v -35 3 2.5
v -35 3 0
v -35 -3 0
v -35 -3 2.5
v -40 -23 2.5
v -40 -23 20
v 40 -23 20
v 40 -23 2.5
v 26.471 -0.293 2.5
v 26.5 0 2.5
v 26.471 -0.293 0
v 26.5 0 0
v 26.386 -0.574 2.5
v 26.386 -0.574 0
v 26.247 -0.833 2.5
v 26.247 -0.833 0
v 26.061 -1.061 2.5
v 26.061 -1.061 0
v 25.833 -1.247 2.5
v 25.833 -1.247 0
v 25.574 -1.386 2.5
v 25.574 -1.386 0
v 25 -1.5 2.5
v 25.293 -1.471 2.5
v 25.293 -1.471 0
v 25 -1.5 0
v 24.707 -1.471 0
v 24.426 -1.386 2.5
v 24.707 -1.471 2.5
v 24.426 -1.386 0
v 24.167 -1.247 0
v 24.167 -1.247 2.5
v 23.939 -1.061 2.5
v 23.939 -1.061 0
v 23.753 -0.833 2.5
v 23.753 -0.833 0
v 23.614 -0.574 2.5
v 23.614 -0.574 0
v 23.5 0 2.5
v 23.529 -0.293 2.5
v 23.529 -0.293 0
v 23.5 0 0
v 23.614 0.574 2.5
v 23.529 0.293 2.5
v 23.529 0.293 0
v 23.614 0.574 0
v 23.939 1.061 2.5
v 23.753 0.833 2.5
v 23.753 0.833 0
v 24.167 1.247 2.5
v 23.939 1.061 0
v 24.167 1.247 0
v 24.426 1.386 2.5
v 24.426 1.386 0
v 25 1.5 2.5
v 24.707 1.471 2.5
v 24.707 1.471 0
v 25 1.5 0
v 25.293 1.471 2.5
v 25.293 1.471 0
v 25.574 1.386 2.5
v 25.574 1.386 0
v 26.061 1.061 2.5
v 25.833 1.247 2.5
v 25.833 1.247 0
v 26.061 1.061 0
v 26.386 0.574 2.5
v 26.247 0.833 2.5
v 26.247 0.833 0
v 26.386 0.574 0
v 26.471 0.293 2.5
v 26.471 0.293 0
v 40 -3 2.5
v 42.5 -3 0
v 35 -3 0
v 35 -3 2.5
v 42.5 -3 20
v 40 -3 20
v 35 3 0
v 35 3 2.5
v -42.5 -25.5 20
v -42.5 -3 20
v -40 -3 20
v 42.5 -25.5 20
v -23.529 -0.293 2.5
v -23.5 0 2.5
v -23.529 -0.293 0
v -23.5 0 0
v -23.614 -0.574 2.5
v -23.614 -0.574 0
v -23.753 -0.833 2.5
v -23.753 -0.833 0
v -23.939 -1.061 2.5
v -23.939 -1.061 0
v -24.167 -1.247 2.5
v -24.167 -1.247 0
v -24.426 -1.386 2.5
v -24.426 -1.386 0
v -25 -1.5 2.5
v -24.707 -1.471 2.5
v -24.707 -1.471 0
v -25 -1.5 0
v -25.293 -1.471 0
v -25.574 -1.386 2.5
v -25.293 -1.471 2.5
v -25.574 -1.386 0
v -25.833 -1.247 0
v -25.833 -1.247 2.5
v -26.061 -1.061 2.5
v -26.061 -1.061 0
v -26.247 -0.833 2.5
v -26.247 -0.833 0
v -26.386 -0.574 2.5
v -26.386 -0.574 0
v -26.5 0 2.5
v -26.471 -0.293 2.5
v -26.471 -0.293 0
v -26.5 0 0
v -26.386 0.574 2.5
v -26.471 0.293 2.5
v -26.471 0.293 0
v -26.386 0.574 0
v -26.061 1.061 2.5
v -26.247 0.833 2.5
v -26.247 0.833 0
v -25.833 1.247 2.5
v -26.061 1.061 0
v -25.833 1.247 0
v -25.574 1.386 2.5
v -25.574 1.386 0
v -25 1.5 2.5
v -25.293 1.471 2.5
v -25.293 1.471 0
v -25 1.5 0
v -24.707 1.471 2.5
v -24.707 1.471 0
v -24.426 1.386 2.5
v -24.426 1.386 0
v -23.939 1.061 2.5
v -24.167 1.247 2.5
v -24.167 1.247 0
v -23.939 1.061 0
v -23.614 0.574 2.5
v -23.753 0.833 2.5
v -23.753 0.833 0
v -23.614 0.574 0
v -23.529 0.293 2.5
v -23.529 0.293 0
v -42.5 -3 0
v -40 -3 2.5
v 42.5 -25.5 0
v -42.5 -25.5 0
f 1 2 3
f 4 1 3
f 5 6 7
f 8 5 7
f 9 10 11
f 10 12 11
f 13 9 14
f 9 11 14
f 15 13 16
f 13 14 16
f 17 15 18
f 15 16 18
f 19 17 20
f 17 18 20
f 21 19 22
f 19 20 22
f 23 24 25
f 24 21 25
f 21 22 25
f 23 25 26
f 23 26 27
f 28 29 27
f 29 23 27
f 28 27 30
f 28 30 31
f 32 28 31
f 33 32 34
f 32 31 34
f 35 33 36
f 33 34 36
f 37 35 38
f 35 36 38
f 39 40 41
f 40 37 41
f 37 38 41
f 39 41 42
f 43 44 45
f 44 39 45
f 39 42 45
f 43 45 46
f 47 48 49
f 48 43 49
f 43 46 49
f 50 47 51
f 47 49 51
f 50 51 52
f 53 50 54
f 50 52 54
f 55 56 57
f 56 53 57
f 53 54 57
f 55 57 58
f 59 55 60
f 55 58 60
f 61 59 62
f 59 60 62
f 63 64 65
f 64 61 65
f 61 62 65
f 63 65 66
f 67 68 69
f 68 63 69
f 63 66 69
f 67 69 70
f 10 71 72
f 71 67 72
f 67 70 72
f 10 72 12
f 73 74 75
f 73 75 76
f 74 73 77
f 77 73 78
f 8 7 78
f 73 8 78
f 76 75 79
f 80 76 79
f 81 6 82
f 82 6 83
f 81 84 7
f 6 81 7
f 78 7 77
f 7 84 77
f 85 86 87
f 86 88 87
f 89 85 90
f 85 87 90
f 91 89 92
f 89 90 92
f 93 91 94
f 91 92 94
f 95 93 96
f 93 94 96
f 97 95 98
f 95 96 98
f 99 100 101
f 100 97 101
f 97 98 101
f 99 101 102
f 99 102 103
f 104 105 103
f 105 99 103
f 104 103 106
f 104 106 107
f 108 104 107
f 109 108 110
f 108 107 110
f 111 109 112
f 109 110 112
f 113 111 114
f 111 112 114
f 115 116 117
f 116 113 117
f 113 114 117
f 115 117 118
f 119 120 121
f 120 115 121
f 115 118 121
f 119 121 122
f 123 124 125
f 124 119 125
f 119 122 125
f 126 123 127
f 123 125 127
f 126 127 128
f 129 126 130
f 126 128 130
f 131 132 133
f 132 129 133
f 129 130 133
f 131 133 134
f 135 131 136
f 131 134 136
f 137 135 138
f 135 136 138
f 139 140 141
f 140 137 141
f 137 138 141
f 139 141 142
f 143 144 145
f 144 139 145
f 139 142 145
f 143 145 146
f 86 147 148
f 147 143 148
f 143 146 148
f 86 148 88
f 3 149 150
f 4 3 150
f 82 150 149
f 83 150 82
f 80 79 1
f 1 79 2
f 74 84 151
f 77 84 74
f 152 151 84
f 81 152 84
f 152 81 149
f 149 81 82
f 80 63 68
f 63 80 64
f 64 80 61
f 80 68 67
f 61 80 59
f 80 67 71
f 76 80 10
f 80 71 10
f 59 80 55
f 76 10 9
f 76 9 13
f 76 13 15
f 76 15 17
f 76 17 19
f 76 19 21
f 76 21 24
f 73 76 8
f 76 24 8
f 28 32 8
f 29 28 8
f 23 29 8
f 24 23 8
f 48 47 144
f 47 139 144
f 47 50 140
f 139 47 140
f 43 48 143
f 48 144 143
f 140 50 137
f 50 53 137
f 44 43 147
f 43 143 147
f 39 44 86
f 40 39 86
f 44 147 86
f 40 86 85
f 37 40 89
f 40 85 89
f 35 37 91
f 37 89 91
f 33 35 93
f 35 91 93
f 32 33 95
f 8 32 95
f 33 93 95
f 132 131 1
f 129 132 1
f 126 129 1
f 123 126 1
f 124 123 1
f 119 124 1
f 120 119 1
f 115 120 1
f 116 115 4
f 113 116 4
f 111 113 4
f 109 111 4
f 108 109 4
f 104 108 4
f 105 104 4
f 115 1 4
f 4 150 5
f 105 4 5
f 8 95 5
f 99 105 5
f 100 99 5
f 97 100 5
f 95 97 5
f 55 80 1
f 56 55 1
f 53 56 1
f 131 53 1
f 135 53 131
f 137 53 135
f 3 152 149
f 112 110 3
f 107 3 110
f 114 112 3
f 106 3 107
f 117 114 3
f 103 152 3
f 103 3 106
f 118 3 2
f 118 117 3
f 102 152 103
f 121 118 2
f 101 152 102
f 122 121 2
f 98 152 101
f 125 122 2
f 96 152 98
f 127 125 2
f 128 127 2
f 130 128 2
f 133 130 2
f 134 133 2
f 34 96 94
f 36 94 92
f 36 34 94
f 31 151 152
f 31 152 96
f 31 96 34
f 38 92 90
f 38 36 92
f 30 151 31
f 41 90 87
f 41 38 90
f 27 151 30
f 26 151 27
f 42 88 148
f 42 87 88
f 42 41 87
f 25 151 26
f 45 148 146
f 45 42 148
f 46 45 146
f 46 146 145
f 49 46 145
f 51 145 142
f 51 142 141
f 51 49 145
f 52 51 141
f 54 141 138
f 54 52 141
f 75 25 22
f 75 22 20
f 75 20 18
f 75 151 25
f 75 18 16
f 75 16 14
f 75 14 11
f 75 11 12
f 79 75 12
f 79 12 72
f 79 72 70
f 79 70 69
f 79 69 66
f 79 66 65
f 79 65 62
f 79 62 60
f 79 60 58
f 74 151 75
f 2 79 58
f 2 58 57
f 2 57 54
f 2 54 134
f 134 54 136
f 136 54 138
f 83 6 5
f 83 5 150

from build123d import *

# Parameters (mm, degrees)
F1_DEPTH  = 2.5
F2_R      = 1.5
F3_DEPTH  = 2.501
F4_W      = 20
F4_H      = 2.5
F5_DEPTH  = 5
F7_W      = 80
F7_H      = 20
F8_DEPTH  = 2.5
F9_W      = 22.5
F9_H      = 20
F10_DEPTH = 2.5


with BuildPart() as f1:
    # F0 (on Top) → F1 (new body)
    with BuildSketch(Plane.XY):
        Polygon((35, -3), (35, 3), (-35, 3), (-35, -3), (-35, -23), (35, -23), align=None)
    extrude(amount=F1_DEPTH)

    # F2 (on face) → F3 (cut, through all)
    with BuildSketch(Plane(origin=(0, 0, 0), x_dir=(1, 0, 0), z_dir=(0, 0, -1))):
        with Locations((-25, 0)):
            Circle(F2_R)
        with Locations((25, 0)):
            Circle(F2_R)
    extrude(amount=-F3_DEPTH, mode=Mode.SUBTRACT)

    # F4 (on face) → F5 (join)
    with BuildSketch(Plane(origin=(-35, 0, 0), x_dir=(0, -1, 0), z_dir=(-1, 0, 0))):
        with Locations((13, 1.25)):
            Rectangle(F4_W, F4_H)
    extrude(amount=F5_DEPTH)

    # F6: F1 across plane


with BuildPart() as f1_1:
    add(f1.part)
    add(f1.part.mirror(Plane.YZ))

    # F7 (on face) → F8 (join)
    with BuildSketch(Plane.XZ.offset(23)):
        with Locations((0, 10)):
            Rectangle(F7_W, F7_H)
    extrude(amount=F8_DEPTH)

    # F9 (on face) → F10 (join)
    with BuildSketch(Plane.YZ.offset(40)):
        with Locations((-14.25, 10)):
            Rectangle(F9_W, F9_H)
    extrude(amount=F10_DEPTH)

    # F11: F1 across plane


with BuildPart() as f1_2:
    add(f1_1.part)
    add(f1_1.part.mirror(Plane.YZ))


solid = f1_2.part
